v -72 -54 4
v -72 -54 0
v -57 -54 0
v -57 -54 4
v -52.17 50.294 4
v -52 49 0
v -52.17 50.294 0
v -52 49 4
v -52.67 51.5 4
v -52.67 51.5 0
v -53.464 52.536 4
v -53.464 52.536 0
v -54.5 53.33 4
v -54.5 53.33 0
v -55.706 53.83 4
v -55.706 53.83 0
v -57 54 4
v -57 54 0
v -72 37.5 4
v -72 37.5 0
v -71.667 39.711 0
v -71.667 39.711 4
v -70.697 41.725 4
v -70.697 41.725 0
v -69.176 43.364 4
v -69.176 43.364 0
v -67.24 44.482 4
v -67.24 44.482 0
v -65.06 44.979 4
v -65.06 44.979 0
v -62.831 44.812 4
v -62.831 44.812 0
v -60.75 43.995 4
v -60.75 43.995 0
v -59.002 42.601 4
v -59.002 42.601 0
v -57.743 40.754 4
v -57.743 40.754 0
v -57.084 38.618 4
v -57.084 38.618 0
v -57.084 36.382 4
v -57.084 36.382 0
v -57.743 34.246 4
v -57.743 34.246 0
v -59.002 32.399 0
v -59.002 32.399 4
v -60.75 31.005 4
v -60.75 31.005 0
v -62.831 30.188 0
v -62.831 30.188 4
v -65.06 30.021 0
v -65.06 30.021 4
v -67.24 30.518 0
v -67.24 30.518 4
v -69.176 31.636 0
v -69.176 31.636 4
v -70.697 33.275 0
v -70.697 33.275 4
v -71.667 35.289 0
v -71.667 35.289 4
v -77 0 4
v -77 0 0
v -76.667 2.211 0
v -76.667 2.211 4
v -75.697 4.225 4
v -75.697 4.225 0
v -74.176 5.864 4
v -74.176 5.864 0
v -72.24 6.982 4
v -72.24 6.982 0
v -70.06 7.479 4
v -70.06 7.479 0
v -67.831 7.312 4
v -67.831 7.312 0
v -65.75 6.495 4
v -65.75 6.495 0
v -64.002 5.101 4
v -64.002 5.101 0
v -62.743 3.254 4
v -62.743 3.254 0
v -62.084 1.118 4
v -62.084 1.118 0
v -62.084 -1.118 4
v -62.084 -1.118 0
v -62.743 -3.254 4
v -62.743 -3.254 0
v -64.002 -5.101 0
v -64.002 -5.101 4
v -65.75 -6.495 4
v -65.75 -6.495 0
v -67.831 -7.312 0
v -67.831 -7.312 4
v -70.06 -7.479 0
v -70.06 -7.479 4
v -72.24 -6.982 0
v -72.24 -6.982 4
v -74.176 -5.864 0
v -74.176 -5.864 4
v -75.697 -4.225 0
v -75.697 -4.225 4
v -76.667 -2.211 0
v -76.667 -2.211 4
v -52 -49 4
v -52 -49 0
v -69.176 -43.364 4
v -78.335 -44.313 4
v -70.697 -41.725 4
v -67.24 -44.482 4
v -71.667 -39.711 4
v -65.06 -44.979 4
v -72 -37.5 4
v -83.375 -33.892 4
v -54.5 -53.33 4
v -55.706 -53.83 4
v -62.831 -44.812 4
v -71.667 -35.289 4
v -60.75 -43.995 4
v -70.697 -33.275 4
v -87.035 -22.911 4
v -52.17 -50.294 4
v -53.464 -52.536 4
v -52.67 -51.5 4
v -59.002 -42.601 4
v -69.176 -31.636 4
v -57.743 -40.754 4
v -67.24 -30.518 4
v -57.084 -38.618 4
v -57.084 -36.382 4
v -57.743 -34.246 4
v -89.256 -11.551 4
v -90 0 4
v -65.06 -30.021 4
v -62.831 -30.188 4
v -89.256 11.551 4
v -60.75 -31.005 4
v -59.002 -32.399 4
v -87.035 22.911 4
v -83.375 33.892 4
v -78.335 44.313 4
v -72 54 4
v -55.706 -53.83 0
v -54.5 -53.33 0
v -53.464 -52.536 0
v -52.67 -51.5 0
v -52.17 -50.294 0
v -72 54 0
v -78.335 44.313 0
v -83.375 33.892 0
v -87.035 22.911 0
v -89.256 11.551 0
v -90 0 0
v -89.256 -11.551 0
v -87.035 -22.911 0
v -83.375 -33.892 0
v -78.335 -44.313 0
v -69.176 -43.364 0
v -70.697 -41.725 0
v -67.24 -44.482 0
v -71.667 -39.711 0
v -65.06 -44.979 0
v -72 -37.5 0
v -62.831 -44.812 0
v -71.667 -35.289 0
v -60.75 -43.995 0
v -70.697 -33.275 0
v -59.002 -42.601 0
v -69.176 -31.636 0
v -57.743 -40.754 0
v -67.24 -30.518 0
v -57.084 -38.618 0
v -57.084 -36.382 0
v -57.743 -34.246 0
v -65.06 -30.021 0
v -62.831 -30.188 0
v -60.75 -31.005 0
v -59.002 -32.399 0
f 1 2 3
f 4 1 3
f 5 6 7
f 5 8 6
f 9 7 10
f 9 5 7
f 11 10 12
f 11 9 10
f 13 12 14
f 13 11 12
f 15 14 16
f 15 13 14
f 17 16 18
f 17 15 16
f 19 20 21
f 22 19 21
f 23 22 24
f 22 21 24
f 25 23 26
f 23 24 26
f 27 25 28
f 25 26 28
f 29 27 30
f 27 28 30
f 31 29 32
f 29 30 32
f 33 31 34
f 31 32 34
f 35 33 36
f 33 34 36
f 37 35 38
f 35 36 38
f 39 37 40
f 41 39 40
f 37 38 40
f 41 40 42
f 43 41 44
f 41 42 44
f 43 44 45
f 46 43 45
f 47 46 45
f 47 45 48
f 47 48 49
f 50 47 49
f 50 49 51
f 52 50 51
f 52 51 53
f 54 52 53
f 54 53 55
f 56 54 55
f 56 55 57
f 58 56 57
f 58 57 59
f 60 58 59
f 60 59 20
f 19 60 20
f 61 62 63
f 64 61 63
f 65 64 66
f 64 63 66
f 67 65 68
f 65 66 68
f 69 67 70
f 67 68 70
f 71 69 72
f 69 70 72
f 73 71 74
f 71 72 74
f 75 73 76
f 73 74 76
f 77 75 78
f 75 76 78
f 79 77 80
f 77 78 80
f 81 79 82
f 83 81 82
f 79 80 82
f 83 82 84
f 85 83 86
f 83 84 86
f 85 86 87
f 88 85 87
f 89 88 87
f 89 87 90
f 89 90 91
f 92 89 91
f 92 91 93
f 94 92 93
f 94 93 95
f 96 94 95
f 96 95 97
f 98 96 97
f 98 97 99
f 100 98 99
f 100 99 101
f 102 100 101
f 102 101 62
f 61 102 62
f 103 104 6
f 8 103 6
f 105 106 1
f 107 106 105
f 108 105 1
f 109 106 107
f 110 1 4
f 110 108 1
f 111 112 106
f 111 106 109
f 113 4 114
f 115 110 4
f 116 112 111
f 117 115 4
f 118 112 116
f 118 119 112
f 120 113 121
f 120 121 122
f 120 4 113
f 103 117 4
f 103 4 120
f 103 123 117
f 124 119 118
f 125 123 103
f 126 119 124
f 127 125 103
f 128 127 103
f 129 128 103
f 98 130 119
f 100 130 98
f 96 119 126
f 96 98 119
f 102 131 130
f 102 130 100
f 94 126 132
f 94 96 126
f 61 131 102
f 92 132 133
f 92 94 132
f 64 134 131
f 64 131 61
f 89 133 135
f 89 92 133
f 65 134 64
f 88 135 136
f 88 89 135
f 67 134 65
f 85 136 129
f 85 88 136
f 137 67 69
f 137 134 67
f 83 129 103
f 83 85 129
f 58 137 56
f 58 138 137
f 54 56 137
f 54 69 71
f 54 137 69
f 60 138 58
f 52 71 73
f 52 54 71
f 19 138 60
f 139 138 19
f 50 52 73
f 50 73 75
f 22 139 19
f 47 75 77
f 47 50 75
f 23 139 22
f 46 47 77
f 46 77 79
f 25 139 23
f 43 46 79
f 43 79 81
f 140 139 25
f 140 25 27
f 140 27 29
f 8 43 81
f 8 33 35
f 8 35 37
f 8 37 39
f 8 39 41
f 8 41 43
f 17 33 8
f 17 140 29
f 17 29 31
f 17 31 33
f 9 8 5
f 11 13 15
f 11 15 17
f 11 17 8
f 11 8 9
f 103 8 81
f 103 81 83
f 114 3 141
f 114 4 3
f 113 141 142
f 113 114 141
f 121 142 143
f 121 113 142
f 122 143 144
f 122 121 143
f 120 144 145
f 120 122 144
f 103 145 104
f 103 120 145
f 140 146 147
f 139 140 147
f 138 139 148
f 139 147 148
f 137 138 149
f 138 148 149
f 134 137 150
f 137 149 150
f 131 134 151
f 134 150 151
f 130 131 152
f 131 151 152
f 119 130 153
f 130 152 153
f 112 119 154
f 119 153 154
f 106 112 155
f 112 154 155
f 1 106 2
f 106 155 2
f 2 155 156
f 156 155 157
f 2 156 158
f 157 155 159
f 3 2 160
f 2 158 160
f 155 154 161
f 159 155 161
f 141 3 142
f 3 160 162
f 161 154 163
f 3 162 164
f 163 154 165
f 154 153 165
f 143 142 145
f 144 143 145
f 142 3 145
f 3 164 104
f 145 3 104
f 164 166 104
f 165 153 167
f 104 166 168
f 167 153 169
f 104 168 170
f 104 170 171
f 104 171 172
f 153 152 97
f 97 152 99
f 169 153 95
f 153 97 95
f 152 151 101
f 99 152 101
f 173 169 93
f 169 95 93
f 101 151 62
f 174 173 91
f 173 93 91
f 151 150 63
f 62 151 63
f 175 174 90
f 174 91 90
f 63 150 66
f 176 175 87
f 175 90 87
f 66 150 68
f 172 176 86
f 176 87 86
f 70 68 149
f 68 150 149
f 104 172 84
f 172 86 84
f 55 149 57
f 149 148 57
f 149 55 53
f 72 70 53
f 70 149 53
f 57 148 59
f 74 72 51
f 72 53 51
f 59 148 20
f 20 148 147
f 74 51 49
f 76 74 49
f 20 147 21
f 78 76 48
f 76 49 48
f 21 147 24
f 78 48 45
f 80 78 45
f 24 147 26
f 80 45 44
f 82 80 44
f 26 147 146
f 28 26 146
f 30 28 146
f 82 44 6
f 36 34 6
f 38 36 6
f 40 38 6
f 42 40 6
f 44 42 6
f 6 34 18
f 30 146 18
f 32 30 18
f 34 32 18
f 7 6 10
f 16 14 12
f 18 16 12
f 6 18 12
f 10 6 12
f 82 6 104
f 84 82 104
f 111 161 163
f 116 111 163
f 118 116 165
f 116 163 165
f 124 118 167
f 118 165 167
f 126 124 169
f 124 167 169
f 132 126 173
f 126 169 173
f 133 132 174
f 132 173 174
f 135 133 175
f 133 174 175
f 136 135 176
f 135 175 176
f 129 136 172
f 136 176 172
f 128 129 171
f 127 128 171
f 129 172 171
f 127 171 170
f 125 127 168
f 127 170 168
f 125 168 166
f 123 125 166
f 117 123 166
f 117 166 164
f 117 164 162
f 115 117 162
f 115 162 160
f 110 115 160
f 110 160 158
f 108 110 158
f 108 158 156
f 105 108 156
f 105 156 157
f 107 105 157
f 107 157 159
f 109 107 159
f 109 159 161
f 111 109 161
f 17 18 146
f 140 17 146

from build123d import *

# Parameters (mm, degrees)
RESSALTO_EXTRUS_O1_DEPTH = 4
ESBO_O2_R                = 7.5
CORTE_EXTRUS_O1_DEPTH    = 10
FILETE1_R                = 5


with BuildPart() as part:
    # Esboço1 → Ressalto-extrusão1 (new body)
    with BuildSketch(Plane.XY):
        with BuildLine():
            Line((-72, -54), (-52, -54))
            Line((-52, -54), (-52, 54))
            Line((-52, 54), (-72, 54))
            ThreePointArc((-72, 54), (-90, 0), (-72, -54))
        make_face()
    extrude(amount=RESSALTO_EXTRUS_O1_DEPTH)

    # Esboço2 → Corte-extrusão1 (cut)
    with BuildSketch(Plane(origin=(0, 0, 0), x_dir=(-1, 0, 0), z_dir=(0, 0, -1))):
        with Locations((69.5, 0)):
            Circle(ESBO_O2_R)
        with Locations((64.5, -37.5)):
            Circle(ESBO_O2_R)
        with Locations((64.5, 37.5)):
            Circle(ESBO_O2_R)
    extrude(amount=-CORTE_EXTRUS_O1_DEPTH, mode=Mode.SUBTRACT)

    # Filete1
    filete1_edges = [part.edges().sort_by_distance(p)[0] for p in [
        (-52, 54, 2),
        (-52, -54, 2),
    ]]
    fillet(filete1_edges, radius=FILETE1_R)


solid = part.part
